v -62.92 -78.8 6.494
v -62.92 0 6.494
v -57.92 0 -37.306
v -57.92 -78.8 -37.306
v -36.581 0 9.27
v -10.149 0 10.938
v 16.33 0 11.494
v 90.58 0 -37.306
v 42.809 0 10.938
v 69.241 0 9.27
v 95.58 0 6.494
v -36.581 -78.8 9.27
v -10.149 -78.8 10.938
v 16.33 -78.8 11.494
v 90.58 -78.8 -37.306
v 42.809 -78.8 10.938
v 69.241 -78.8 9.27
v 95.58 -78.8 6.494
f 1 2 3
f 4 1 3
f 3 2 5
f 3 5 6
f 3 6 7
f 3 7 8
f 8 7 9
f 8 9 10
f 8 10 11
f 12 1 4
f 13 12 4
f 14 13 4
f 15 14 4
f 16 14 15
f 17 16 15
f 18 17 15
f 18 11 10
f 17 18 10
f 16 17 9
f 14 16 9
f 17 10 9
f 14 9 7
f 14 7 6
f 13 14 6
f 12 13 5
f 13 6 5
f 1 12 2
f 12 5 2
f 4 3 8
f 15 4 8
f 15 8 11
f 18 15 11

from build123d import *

# Parameters (mm, degrees)
F1_DEPTH = 78.8


with BuildPart() as f1:
    # F0 (on Front) → F1 (new body)
    with BuildSketch(Plane.XZ):
        with BuildLine():
            Line((-62.92016, 6.494325), (-57.92016, -37.305675))
            Line((-57.92016, -37.305675), (90.57984, -37.305675))
            Line((90.57984, -37.305675), (95.57984, 6.494325))
            ThreePointArc((95.57984, 6.494325), (56.033626, 10.243084), (16.32984, 11.494325))
            ThreePointArc((16.32984, 11.494325), (-23.373946, 10.243084), (-62.92016, 6.494325))
        make_face()
    extrude(amount=F1_DEPTH)


solid = f1.part
